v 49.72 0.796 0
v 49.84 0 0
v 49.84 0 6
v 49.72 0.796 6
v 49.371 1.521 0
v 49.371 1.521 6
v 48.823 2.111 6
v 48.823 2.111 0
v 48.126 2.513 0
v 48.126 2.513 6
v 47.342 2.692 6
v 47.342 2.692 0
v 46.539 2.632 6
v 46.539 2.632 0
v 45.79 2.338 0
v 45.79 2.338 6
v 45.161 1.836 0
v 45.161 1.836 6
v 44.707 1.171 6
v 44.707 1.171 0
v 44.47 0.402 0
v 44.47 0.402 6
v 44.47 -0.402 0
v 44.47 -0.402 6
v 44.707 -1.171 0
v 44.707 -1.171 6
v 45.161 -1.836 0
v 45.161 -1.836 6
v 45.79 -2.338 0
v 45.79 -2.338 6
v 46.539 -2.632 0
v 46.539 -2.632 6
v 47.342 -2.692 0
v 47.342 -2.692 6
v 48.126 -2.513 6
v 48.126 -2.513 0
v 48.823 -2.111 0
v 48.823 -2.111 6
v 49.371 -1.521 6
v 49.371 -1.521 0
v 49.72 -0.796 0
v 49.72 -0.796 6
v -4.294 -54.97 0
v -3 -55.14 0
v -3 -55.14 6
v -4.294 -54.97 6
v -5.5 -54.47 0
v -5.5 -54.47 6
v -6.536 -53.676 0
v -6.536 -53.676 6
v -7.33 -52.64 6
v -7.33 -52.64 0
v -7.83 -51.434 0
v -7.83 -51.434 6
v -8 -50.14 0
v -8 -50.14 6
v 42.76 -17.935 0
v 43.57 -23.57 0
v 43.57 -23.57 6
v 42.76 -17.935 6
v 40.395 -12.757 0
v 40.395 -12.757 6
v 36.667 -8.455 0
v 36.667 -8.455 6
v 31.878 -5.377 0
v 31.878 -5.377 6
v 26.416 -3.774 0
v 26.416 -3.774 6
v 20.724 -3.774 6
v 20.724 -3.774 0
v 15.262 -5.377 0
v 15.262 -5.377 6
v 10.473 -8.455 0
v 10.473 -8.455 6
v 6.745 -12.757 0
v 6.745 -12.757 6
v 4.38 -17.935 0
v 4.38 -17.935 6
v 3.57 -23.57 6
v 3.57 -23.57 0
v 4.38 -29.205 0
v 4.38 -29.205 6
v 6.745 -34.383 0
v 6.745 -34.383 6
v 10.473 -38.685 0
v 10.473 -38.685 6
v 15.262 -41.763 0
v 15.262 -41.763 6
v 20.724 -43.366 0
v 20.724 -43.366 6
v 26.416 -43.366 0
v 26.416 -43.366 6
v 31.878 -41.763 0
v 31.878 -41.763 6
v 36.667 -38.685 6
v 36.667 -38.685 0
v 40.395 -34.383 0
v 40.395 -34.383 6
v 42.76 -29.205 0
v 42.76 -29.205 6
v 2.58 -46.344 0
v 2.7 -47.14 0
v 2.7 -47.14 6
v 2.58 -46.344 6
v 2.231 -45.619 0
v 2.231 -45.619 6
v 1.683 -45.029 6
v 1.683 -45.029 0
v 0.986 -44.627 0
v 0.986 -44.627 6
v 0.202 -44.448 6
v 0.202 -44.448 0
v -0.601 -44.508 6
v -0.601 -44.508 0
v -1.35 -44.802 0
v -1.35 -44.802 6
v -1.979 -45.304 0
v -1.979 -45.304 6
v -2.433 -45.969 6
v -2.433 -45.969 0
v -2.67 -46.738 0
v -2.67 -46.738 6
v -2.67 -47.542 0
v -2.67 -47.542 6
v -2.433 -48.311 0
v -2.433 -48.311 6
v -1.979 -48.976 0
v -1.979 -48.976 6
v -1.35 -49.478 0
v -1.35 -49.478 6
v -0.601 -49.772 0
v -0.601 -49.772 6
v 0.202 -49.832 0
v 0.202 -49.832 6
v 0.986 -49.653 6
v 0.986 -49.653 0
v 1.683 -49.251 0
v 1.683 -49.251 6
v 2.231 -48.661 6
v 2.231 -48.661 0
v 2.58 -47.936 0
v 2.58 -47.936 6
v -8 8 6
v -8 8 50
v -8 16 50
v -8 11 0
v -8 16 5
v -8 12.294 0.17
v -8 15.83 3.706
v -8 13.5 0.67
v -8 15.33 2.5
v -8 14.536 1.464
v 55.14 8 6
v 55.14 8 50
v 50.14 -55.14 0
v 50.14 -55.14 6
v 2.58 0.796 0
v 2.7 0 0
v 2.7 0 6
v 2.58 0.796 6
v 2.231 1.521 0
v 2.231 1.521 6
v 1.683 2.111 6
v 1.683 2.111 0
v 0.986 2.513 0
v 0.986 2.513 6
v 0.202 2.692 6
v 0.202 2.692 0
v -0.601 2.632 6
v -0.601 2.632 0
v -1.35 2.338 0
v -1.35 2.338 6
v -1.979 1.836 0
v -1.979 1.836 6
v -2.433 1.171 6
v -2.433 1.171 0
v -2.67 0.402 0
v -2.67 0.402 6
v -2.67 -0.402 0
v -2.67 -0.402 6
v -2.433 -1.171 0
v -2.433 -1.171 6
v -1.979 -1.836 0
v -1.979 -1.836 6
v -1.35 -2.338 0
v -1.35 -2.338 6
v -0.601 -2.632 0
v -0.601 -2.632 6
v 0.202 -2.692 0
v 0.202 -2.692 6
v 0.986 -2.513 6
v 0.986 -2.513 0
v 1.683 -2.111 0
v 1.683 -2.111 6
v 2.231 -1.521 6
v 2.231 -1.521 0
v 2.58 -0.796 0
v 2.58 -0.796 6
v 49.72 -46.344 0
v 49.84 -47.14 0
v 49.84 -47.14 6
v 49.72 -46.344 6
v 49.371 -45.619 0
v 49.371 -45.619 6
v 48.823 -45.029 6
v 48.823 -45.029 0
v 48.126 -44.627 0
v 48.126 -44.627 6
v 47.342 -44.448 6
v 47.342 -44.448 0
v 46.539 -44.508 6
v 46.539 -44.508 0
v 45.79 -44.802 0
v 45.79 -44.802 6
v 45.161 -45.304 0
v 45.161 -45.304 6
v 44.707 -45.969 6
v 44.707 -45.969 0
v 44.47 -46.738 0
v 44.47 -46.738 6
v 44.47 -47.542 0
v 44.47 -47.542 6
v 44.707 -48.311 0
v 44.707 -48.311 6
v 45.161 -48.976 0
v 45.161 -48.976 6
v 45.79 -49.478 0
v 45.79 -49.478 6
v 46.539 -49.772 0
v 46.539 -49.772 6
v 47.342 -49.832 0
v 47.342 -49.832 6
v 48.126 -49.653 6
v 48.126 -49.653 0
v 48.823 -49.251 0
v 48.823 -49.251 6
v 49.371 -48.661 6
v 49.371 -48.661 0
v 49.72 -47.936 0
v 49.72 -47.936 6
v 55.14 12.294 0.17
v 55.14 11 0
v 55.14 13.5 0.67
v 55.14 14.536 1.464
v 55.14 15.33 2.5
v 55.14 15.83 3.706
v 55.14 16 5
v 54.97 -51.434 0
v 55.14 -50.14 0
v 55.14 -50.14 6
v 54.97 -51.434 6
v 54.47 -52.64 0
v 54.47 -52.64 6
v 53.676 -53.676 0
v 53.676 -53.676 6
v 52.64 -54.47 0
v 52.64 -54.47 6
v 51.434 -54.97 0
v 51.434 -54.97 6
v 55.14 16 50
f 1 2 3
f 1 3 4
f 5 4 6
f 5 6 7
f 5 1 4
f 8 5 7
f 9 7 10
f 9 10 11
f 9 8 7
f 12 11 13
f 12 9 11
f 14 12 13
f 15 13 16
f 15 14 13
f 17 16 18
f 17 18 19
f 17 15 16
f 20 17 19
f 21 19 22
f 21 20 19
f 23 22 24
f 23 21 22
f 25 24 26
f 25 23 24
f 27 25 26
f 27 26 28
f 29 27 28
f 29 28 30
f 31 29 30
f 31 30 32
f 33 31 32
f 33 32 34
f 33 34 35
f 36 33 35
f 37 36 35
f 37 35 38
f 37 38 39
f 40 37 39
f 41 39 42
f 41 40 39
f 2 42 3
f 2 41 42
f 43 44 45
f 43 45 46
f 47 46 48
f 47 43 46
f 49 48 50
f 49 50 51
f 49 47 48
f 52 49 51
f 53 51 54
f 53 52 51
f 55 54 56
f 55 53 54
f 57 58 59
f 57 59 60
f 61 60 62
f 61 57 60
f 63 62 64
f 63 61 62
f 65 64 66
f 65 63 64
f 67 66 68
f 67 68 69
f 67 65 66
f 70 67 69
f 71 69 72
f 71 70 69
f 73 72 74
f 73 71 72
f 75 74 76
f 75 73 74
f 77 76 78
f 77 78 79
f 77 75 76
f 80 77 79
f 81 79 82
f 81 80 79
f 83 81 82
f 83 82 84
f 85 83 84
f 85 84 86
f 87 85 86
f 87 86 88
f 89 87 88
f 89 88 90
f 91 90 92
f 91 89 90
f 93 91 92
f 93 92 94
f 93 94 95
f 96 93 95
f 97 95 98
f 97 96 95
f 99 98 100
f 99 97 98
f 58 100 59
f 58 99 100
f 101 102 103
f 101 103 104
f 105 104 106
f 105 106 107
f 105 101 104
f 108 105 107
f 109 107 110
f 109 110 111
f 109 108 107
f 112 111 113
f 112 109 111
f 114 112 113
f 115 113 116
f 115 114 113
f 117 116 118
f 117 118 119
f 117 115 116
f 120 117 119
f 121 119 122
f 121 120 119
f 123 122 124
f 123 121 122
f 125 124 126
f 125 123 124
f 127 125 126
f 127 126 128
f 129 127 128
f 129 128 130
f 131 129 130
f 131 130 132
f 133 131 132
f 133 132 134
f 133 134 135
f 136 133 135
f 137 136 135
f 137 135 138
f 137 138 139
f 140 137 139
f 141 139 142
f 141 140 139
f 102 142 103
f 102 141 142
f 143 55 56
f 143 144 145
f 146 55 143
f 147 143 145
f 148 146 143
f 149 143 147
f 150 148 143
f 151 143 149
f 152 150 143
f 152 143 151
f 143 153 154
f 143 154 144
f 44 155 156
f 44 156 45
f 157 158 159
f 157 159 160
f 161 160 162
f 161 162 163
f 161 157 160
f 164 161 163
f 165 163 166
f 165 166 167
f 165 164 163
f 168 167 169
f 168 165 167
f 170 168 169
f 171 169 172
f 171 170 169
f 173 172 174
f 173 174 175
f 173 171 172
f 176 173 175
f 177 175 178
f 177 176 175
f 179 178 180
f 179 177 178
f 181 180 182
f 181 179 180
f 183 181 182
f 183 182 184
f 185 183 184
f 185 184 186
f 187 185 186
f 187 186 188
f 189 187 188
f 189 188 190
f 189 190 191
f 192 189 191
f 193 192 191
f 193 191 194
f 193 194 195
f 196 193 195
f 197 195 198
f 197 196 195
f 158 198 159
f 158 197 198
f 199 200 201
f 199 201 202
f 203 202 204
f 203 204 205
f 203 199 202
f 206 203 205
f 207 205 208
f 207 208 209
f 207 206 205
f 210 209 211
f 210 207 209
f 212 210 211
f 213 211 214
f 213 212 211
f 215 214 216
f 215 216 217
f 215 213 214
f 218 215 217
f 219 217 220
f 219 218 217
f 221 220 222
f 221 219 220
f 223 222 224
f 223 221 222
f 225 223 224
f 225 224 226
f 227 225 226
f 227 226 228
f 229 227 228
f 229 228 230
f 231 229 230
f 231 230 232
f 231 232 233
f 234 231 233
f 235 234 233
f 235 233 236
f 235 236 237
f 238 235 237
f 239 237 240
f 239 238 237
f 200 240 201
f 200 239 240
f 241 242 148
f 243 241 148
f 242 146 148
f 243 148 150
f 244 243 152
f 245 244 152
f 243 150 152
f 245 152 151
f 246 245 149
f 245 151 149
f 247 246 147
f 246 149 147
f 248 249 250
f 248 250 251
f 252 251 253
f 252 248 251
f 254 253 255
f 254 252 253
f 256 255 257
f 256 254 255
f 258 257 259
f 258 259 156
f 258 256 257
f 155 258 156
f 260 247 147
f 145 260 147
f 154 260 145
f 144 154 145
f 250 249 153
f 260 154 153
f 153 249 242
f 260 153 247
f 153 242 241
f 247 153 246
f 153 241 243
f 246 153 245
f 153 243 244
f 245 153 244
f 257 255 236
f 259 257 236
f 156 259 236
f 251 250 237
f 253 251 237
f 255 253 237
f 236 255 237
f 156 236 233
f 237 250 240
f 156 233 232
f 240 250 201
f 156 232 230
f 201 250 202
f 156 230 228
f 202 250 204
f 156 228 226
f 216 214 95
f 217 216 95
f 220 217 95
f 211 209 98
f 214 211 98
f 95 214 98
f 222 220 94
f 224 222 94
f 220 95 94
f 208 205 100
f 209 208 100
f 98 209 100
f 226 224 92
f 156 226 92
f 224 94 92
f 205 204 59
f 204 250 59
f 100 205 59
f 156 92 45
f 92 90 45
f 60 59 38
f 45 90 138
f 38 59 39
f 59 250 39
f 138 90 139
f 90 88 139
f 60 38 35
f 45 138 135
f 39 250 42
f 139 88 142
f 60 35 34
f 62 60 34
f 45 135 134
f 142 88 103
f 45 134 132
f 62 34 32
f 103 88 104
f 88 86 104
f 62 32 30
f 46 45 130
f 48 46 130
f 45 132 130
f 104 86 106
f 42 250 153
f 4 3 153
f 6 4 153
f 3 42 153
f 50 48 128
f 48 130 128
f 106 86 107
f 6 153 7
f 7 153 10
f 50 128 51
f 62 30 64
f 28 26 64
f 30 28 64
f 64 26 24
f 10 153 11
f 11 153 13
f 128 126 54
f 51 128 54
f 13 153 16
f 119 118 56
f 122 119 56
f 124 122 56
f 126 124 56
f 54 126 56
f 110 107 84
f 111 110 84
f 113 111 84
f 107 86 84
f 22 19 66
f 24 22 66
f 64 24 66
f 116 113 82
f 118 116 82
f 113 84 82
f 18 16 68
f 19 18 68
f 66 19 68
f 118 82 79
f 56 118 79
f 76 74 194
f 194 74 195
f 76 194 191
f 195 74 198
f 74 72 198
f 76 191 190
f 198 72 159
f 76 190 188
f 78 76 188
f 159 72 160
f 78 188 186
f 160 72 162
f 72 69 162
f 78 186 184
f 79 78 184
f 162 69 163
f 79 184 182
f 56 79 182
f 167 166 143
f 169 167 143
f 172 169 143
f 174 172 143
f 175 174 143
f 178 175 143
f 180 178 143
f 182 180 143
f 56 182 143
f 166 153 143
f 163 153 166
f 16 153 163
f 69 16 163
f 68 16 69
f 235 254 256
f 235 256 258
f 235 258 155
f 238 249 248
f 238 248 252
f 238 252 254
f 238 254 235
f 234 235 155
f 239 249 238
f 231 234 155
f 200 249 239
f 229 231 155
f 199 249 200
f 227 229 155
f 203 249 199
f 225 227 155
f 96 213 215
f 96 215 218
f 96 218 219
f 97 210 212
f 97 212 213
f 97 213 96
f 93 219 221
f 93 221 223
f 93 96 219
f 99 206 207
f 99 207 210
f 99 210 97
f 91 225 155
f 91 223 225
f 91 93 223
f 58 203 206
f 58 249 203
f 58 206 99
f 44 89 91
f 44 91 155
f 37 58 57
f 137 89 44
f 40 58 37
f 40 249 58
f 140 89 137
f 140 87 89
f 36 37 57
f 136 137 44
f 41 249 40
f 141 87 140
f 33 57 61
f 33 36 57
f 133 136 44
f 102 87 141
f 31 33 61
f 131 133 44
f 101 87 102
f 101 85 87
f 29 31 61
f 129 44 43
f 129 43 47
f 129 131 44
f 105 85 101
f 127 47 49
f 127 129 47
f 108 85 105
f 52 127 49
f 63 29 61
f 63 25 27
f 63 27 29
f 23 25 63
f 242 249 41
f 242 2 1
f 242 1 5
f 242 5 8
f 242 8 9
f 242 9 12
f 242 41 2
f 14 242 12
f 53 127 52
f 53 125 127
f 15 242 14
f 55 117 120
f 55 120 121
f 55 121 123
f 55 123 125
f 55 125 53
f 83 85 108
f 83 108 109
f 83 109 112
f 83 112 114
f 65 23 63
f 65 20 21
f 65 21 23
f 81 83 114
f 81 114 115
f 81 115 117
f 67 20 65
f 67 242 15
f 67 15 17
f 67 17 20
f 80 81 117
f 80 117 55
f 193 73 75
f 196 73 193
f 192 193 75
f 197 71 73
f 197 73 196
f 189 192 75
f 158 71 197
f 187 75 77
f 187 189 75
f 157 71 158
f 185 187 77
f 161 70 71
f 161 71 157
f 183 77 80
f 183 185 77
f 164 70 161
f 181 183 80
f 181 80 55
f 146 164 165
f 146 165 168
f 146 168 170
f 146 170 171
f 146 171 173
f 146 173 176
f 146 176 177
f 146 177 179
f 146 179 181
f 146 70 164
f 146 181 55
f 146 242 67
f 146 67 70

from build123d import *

# Parameters (mm, degrees)
CROQUIS1_R              = 2.7
CROQUIS1_R_2            = 20
SALIENTE_EXTRUIR1_DEPTH = 6
CROQUIS2_W              = 63.14
CROQUIS2_H              = 8
SALIENTE_EXTRUIR2_DEPTH = 50
REDONDEO1_R             = 5


with BuildPart() as part:
    # Croquis1 → Saliente-Extruir1 (new body)
    with BuildSketch(Plane.XY):
        with BuildLine():
            Line((-8, -50.14), (-8, 8))
            Line((-8, 8), (55.14, 8))
            Line((55.14, 8), (55.14, -50.14))
            ThreePointArc((55.14, -50.14), (53.675533906, -53.675533906), (50.14, -55.14))
            Line((50.14, -55.14), (-3, -55.14))
            ThreePointArc((-3, -55.14), (-6.535533906, -53.675533906), (-8, -50.14))
        make_face()
        Circle(CROQUIS1_R, mode=Mode.SUBTRACT)
        with Locations((47.14, 0)):
            Circle(CROQUIS1_R, mode=Mode.SUBTRACT)
        with Locations((47.14, -47.14)):
            Circle(CROQUIS1_R, mode=Mode.SUBTRACT)
        with Locations((0, -47.14)):
            Circle(CROQUIS1_R, mode=Mode.SUBTRACT)
        with Locations((23.57, -23.57)):
            Circle(CROQUIS1_R_2, mode=Mode.SUBTRACT)
    extrude(amount=SALIENTE_EXTRUIR1_DEPTH)

    # Croquis2 → Saliente-Extruir2 (add)
    with BuildSketch(Plane(origin=(0, 0, 0), x_dir=(-1, 0, 0), z_dir=(0, 0, -1))):
        with Locations((-23.57, 12)):
            Rectangle(CROQUIS2_W, CROQUIS2_H)
    extrude(amount=-SALIENTE_EXTRUIR2_DEPTH)

    # Redondeo1
    redondeo1_edges = [part.edges().sort_by_distance(p)[0] for p in [
        (23.57, 16, 0),
    ]]
    fillet(redondeo1_edges, radius=REDONDEO1_R)


solid = part.part
